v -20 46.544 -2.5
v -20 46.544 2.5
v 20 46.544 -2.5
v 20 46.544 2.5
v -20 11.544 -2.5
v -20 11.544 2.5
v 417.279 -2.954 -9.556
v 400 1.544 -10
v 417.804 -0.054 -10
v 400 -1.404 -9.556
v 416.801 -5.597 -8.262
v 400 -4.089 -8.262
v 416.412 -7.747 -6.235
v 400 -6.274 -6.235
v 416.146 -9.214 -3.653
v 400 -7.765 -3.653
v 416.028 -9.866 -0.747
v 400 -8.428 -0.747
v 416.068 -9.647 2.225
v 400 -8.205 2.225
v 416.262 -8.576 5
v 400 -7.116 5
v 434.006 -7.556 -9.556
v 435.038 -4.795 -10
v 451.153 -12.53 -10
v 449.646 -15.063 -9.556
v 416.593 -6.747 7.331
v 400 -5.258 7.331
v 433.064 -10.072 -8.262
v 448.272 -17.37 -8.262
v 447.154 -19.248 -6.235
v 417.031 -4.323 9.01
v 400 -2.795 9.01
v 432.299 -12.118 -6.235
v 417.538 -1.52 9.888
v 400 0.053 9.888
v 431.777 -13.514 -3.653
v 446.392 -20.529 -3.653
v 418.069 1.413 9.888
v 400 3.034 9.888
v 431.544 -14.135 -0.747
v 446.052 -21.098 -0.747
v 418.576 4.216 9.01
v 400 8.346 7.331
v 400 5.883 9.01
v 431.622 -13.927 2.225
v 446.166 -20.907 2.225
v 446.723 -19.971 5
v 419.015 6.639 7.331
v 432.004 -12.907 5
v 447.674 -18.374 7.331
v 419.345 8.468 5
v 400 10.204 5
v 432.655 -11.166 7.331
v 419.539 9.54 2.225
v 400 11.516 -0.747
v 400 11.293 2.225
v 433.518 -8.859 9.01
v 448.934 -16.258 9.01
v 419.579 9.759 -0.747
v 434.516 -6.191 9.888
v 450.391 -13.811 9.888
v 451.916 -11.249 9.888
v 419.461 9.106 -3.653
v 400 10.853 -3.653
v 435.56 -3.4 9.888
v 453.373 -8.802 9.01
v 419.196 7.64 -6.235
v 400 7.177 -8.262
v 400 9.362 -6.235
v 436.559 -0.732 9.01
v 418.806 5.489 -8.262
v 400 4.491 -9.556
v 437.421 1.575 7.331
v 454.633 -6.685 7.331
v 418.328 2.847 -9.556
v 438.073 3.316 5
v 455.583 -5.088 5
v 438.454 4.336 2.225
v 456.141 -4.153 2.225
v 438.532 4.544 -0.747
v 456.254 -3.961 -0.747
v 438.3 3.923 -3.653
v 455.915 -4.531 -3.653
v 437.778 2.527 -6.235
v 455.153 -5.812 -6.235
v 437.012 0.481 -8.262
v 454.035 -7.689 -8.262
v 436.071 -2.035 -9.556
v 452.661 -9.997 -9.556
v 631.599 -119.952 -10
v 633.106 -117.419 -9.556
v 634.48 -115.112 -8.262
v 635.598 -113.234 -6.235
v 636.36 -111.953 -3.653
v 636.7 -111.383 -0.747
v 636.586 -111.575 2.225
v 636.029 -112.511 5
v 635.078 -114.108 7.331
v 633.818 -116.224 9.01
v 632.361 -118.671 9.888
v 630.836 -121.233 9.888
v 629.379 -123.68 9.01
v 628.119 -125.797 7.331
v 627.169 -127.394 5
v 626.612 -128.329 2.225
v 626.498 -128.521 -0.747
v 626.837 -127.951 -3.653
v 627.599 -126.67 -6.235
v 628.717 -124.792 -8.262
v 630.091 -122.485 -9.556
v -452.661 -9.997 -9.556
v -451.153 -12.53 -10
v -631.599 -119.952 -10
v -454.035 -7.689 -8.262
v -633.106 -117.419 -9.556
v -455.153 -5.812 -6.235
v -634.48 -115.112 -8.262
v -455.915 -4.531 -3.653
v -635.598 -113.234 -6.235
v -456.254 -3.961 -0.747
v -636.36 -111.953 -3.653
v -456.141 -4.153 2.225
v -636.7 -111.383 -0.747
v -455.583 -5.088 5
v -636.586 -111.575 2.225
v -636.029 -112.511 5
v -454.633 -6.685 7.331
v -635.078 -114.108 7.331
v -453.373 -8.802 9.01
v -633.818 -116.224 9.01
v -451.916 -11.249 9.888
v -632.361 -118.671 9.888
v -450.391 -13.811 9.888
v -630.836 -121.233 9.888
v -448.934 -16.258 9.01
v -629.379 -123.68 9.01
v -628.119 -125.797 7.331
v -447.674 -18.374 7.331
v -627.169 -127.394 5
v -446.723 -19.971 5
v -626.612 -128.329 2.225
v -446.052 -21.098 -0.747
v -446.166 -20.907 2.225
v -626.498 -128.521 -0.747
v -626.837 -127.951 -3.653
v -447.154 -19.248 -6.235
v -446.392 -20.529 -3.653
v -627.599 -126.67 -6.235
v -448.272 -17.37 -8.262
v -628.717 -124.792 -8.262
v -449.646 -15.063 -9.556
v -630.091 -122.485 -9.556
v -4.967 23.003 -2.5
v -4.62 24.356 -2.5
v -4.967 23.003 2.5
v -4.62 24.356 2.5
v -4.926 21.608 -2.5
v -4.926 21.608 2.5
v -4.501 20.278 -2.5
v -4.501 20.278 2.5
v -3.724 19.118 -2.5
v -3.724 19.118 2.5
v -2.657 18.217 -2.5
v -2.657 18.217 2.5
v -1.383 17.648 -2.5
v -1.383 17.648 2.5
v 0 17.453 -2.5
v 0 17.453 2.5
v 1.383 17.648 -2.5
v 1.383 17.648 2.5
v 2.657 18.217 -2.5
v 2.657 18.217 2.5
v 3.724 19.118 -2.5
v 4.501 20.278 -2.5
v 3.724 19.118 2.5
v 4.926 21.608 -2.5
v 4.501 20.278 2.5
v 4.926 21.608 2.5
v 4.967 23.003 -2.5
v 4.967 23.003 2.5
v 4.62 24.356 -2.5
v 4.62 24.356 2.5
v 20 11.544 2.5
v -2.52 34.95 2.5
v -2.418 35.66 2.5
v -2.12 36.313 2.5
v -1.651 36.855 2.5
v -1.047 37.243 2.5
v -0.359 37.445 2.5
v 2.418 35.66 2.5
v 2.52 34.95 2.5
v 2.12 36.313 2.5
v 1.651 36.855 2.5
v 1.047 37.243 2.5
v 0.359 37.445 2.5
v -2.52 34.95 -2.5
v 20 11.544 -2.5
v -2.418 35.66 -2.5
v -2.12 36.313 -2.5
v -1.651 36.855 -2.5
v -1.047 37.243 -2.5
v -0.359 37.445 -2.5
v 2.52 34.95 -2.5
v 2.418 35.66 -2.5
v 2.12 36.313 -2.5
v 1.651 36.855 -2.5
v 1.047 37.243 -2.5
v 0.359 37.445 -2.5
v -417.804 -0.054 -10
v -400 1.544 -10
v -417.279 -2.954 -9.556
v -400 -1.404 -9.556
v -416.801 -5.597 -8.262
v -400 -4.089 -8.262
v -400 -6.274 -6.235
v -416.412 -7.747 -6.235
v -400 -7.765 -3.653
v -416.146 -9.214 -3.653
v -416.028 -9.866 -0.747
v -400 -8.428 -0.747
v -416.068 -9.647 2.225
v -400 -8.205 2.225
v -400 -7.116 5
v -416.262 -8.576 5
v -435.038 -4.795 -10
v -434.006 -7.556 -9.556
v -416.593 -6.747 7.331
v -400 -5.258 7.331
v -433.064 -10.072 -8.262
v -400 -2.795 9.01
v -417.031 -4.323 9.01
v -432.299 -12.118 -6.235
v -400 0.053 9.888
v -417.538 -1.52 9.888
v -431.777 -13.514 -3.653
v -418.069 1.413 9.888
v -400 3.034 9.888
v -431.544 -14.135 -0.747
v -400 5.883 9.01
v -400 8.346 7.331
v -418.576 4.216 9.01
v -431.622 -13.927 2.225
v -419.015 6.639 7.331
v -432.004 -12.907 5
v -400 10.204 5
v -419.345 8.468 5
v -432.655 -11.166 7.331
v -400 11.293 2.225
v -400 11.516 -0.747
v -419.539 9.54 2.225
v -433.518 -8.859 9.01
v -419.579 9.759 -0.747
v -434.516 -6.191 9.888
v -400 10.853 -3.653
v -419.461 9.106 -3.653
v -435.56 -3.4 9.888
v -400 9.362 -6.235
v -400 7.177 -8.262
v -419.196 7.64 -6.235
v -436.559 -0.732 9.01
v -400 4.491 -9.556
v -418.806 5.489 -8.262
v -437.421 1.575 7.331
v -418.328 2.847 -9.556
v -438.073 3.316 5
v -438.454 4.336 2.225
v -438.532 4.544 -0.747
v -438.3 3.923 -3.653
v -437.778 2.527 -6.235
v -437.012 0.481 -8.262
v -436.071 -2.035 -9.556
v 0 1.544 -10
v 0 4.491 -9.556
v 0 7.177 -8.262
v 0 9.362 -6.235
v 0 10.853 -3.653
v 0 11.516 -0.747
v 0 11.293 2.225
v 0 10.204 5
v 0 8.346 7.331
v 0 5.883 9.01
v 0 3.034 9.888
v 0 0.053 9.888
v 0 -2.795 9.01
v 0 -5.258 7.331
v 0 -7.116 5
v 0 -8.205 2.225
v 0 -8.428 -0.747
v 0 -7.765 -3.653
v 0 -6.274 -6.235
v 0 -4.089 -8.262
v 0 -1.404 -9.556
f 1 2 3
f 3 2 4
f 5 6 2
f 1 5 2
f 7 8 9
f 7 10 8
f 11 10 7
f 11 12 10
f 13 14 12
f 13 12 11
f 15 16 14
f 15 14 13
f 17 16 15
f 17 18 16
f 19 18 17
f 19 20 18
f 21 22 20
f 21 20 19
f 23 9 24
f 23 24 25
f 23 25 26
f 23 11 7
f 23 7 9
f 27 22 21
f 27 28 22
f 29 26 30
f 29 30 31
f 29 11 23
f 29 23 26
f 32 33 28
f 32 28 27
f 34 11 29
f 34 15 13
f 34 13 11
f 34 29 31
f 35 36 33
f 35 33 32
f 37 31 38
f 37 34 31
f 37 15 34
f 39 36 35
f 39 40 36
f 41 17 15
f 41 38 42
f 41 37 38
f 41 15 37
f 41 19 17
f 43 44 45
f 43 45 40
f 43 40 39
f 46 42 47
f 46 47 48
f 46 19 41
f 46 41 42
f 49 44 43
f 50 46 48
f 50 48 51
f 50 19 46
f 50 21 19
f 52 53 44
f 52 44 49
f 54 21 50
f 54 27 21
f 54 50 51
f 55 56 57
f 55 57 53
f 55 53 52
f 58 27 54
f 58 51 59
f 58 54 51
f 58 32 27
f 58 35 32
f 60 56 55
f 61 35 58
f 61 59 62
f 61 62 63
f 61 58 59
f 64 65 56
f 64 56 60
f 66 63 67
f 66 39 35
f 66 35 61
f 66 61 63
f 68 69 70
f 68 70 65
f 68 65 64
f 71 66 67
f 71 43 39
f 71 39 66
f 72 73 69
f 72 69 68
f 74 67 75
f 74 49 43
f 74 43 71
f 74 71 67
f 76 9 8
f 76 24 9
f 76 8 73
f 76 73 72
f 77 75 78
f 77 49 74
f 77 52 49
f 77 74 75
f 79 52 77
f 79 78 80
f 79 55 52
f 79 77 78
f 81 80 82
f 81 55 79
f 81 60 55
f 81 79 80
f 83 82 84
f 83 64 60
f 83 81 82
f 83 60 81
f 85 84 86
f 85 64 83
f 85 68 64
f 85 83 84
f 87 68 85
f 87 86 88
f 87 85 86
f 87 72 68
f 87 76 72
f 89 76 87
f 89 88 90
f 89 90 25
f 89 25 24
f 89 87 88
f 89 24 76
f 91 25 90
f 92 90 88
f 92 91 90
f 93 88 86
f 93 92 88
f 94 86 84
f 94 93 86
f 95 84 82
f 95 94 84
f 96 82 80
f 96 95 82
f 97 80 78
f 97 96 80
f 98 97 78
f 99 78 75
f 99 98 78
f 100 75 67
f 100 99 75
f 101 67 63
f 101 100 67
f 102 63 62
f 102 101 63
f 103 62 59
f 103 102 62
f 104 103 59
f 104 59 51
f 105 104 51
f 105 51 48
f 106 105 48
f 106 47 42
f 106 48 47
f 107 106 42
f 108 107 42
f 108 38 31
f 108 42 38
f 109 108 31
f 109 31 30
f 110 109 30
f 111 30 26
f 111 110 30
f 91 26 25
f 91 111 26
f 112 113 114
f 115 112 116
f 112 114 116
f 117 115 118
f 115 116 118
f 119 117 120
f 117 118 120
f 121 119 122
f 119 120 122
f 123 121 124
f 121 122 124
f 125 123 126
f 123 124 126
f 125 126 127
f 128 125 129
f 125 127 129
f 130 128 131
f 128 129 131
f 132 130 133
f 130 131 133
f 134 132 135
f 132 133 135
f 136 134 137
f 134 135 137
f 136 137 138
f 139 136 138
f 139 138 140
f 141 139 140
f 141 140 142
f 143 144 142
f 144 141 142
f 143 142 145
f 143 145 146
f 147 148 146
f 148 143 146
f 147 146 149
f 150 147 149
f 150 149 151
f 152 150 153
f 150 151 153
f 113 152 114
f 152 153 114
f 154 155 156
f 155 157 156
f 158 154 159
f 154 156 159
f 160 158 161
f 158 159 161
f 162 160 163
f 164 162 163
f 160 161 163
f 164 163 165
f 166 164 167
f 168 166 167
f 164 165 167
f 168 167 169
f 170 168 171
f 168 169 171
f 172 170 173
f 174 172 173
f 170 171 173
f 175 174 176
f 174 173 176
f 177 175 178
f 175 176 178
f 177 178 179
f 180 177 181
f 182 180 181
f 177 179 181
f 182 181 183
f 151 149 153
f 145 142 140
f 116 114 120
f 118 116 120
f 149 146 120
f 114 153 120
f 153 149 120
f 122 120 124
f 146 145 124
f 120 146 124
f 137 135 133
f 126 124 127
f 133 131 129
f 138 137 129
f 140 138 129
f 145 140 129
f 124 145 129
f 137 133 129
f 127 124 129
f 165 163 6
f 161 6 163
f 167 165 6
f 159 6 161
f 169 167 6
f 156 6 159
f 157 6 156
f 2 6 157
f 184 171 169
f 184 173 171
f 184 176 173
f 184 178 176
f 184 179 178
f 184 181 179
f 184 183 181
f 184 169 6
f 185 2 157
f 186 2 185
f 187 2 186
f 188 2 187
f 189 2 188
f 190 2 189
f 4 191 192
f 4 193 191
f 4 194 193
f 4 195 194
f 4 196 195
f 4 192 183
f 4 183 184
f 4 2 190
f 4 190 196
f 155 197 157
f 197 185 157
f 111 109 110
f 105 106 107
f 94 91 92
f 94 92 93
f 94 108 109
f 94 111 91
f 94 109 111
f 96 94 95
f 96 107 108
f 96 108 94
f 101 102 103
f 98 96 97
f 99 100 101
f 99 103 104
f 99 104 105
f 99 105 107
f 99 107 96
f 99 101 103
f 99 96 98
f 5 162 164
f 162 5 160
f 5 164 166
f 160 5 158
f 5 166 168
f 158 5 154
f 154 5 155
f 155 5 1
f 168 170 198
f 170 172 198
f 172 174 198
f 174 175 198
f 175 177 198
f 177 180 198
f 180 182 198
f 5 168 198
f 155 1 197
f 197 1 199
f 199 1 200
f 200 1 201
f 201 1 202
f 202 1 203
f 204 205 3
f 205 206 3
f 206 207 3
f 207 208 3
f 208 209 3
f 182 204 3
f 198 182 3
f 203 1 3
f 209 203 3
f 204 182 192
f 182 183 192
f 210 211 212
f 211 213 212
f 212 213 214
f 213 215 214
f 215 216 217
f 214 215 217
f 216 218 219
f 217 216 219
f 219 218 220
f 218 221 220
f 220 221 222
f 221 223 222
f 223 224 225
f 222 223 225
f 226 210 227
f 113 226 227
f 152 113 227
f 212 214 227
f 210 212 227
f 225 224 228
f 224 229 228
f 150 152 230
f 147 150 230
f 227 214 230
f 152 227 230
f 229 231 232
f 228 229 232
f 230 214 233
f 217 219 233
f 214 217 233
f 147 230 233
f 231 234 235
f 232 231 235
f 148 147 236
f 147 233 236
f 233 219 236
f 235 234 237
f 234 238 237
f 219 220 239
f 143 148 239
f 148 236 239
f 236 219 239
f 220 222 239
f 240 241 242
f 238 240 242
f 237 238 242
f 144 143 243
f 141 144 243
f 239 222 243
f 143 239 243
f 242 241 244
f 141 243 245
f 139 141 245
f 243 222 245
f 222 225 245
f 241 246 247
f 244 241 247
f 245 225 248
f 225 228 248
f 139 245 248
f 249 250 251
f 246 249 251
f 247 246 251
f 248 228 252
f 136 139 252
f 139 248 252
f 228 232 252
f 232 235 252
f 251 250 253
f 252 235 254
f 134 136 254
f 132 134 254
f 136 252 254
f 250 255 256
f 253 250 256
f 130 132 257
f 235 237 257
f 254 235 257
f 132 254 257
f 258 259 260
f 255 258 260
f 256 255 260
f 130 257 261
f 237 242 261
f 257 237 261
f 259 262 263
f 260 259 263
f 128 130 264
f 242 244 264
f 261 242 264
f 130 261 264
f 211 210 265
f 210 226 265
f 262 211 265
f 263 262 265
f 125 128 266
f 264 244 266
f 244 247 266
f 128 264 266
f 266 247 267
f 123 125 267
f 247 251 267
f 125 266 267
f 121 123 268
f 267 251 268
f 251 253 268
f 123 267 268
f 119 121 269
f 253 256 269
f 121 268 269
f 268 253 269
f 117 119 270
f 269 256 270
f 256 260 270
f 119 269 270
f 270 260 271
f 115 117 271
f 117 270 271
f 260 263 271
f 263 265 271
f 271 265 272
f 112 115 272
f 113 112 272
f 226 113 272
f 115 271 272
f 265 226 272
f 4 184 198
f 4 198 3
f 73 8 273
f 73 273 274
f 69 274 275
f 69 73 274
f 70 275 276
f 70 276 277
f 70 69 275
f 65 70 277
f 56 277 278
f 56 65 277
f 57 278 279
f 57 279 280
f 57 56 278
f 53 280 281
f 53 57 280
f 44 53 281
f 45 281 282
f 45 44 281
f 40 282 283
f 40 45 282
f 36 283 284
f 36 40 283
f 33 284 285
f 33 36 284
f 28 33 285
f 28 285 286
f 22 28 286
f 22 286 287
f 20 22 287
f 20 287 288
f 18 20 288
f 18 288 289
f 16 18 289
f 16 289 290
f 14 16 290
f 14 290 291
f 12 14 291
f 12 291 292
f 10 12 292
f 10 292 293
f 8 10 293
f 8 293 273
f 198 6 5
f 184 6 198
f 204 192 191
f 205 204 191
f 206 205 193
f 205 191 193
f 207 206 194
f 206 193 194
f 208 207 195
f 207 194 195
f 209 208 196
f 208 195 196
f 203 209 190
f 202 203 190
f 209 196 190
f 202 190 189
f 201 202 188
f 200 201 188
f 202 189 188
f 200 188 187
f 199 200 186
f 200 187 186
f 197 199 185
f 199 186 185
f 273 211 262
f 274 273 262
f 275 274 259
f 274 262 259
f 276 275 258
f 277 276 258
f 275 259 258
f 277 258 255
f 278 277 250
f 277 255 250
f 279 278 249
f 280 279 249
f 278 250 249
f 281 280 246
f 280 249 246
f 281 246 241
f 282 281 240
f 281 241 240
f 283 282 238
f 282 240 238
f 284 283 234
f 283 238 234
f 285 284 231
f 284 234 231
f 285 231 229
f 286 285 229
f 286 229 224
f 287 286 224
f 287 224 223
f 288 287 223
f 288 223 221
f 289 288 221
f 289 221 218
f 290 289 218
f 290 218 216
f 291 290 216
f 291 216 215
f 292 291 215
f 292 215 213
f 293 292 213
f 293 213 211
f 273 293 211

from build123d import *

# Parameters (mm, degrees)
SKETCH2_R           = 10
SKETCH3_W           = 40
SKETCH3_H           = 35
BOSS_EXTRUDE1_DEPTH = 2.5


with BuildPart() as part:
    # Sweep1: sweep along a path in Sketch1
    with BuildLine(Plane.XY) as sweep1_path:
        Line((0, 1.543839384), (400, 1.543839384))
        ThreePointArc((400, 1.543839384), (426.52707958, -2.038765666), (451.153438175, -12.529879637))
        Line((451.153438175, -12.529879637), (631.598628231, -119.952099804))
    # Sketch2 → Sweep1 (sweep)
    with BuildSketch(Plane(origin=(0, 0, 0), x_dir=(0, 0, -1), z_dir=(1, 0, 0))):
        with Locations((0, 1.543839384)):
            Circle(SKETCH2_R)
    sweep(path=sweep1_path.line)

    # Mirror1: part across plane


with BuildPart() as part_1:
    add(part.part)
    add(part.part.mirror(Plane(origin=(0, 1.543839384, 0), x_dir=(0, 0, 1), z_dir=(1, 0, 0))))


with BuildPart() as body_2:
    # Sketch3 → Boss-Extrude1 (new, symmetric)
    with BuildSketch(Plane.XY):
        with Locations((0, 29.043839384)):
            Rectangle(SKETCH3_W, SKETCH3_H)
        with BuildLine():
            ThreePointArc((2.520474072, 34.950049529), (0, 37.470523601), (-2.520474072, 34.950049529))
            Line((-2.520474072, 34.950049529), (-4.619864303, 24.355877315))
            ThreePointArc((-4.619864303, 24.355877315), (0, 17.452517565), (4.619864303, 24.355877315))
            Line((4.619864303, 24.355877315), (2.520474072, 34.950049529))
        make_face(mode=Mode.SUBTRACT)
    extrude(amount=BOSS_EXTRUDE1_DEPTH, both=True)


solid = Compound([part_1.part, body_2.part])
